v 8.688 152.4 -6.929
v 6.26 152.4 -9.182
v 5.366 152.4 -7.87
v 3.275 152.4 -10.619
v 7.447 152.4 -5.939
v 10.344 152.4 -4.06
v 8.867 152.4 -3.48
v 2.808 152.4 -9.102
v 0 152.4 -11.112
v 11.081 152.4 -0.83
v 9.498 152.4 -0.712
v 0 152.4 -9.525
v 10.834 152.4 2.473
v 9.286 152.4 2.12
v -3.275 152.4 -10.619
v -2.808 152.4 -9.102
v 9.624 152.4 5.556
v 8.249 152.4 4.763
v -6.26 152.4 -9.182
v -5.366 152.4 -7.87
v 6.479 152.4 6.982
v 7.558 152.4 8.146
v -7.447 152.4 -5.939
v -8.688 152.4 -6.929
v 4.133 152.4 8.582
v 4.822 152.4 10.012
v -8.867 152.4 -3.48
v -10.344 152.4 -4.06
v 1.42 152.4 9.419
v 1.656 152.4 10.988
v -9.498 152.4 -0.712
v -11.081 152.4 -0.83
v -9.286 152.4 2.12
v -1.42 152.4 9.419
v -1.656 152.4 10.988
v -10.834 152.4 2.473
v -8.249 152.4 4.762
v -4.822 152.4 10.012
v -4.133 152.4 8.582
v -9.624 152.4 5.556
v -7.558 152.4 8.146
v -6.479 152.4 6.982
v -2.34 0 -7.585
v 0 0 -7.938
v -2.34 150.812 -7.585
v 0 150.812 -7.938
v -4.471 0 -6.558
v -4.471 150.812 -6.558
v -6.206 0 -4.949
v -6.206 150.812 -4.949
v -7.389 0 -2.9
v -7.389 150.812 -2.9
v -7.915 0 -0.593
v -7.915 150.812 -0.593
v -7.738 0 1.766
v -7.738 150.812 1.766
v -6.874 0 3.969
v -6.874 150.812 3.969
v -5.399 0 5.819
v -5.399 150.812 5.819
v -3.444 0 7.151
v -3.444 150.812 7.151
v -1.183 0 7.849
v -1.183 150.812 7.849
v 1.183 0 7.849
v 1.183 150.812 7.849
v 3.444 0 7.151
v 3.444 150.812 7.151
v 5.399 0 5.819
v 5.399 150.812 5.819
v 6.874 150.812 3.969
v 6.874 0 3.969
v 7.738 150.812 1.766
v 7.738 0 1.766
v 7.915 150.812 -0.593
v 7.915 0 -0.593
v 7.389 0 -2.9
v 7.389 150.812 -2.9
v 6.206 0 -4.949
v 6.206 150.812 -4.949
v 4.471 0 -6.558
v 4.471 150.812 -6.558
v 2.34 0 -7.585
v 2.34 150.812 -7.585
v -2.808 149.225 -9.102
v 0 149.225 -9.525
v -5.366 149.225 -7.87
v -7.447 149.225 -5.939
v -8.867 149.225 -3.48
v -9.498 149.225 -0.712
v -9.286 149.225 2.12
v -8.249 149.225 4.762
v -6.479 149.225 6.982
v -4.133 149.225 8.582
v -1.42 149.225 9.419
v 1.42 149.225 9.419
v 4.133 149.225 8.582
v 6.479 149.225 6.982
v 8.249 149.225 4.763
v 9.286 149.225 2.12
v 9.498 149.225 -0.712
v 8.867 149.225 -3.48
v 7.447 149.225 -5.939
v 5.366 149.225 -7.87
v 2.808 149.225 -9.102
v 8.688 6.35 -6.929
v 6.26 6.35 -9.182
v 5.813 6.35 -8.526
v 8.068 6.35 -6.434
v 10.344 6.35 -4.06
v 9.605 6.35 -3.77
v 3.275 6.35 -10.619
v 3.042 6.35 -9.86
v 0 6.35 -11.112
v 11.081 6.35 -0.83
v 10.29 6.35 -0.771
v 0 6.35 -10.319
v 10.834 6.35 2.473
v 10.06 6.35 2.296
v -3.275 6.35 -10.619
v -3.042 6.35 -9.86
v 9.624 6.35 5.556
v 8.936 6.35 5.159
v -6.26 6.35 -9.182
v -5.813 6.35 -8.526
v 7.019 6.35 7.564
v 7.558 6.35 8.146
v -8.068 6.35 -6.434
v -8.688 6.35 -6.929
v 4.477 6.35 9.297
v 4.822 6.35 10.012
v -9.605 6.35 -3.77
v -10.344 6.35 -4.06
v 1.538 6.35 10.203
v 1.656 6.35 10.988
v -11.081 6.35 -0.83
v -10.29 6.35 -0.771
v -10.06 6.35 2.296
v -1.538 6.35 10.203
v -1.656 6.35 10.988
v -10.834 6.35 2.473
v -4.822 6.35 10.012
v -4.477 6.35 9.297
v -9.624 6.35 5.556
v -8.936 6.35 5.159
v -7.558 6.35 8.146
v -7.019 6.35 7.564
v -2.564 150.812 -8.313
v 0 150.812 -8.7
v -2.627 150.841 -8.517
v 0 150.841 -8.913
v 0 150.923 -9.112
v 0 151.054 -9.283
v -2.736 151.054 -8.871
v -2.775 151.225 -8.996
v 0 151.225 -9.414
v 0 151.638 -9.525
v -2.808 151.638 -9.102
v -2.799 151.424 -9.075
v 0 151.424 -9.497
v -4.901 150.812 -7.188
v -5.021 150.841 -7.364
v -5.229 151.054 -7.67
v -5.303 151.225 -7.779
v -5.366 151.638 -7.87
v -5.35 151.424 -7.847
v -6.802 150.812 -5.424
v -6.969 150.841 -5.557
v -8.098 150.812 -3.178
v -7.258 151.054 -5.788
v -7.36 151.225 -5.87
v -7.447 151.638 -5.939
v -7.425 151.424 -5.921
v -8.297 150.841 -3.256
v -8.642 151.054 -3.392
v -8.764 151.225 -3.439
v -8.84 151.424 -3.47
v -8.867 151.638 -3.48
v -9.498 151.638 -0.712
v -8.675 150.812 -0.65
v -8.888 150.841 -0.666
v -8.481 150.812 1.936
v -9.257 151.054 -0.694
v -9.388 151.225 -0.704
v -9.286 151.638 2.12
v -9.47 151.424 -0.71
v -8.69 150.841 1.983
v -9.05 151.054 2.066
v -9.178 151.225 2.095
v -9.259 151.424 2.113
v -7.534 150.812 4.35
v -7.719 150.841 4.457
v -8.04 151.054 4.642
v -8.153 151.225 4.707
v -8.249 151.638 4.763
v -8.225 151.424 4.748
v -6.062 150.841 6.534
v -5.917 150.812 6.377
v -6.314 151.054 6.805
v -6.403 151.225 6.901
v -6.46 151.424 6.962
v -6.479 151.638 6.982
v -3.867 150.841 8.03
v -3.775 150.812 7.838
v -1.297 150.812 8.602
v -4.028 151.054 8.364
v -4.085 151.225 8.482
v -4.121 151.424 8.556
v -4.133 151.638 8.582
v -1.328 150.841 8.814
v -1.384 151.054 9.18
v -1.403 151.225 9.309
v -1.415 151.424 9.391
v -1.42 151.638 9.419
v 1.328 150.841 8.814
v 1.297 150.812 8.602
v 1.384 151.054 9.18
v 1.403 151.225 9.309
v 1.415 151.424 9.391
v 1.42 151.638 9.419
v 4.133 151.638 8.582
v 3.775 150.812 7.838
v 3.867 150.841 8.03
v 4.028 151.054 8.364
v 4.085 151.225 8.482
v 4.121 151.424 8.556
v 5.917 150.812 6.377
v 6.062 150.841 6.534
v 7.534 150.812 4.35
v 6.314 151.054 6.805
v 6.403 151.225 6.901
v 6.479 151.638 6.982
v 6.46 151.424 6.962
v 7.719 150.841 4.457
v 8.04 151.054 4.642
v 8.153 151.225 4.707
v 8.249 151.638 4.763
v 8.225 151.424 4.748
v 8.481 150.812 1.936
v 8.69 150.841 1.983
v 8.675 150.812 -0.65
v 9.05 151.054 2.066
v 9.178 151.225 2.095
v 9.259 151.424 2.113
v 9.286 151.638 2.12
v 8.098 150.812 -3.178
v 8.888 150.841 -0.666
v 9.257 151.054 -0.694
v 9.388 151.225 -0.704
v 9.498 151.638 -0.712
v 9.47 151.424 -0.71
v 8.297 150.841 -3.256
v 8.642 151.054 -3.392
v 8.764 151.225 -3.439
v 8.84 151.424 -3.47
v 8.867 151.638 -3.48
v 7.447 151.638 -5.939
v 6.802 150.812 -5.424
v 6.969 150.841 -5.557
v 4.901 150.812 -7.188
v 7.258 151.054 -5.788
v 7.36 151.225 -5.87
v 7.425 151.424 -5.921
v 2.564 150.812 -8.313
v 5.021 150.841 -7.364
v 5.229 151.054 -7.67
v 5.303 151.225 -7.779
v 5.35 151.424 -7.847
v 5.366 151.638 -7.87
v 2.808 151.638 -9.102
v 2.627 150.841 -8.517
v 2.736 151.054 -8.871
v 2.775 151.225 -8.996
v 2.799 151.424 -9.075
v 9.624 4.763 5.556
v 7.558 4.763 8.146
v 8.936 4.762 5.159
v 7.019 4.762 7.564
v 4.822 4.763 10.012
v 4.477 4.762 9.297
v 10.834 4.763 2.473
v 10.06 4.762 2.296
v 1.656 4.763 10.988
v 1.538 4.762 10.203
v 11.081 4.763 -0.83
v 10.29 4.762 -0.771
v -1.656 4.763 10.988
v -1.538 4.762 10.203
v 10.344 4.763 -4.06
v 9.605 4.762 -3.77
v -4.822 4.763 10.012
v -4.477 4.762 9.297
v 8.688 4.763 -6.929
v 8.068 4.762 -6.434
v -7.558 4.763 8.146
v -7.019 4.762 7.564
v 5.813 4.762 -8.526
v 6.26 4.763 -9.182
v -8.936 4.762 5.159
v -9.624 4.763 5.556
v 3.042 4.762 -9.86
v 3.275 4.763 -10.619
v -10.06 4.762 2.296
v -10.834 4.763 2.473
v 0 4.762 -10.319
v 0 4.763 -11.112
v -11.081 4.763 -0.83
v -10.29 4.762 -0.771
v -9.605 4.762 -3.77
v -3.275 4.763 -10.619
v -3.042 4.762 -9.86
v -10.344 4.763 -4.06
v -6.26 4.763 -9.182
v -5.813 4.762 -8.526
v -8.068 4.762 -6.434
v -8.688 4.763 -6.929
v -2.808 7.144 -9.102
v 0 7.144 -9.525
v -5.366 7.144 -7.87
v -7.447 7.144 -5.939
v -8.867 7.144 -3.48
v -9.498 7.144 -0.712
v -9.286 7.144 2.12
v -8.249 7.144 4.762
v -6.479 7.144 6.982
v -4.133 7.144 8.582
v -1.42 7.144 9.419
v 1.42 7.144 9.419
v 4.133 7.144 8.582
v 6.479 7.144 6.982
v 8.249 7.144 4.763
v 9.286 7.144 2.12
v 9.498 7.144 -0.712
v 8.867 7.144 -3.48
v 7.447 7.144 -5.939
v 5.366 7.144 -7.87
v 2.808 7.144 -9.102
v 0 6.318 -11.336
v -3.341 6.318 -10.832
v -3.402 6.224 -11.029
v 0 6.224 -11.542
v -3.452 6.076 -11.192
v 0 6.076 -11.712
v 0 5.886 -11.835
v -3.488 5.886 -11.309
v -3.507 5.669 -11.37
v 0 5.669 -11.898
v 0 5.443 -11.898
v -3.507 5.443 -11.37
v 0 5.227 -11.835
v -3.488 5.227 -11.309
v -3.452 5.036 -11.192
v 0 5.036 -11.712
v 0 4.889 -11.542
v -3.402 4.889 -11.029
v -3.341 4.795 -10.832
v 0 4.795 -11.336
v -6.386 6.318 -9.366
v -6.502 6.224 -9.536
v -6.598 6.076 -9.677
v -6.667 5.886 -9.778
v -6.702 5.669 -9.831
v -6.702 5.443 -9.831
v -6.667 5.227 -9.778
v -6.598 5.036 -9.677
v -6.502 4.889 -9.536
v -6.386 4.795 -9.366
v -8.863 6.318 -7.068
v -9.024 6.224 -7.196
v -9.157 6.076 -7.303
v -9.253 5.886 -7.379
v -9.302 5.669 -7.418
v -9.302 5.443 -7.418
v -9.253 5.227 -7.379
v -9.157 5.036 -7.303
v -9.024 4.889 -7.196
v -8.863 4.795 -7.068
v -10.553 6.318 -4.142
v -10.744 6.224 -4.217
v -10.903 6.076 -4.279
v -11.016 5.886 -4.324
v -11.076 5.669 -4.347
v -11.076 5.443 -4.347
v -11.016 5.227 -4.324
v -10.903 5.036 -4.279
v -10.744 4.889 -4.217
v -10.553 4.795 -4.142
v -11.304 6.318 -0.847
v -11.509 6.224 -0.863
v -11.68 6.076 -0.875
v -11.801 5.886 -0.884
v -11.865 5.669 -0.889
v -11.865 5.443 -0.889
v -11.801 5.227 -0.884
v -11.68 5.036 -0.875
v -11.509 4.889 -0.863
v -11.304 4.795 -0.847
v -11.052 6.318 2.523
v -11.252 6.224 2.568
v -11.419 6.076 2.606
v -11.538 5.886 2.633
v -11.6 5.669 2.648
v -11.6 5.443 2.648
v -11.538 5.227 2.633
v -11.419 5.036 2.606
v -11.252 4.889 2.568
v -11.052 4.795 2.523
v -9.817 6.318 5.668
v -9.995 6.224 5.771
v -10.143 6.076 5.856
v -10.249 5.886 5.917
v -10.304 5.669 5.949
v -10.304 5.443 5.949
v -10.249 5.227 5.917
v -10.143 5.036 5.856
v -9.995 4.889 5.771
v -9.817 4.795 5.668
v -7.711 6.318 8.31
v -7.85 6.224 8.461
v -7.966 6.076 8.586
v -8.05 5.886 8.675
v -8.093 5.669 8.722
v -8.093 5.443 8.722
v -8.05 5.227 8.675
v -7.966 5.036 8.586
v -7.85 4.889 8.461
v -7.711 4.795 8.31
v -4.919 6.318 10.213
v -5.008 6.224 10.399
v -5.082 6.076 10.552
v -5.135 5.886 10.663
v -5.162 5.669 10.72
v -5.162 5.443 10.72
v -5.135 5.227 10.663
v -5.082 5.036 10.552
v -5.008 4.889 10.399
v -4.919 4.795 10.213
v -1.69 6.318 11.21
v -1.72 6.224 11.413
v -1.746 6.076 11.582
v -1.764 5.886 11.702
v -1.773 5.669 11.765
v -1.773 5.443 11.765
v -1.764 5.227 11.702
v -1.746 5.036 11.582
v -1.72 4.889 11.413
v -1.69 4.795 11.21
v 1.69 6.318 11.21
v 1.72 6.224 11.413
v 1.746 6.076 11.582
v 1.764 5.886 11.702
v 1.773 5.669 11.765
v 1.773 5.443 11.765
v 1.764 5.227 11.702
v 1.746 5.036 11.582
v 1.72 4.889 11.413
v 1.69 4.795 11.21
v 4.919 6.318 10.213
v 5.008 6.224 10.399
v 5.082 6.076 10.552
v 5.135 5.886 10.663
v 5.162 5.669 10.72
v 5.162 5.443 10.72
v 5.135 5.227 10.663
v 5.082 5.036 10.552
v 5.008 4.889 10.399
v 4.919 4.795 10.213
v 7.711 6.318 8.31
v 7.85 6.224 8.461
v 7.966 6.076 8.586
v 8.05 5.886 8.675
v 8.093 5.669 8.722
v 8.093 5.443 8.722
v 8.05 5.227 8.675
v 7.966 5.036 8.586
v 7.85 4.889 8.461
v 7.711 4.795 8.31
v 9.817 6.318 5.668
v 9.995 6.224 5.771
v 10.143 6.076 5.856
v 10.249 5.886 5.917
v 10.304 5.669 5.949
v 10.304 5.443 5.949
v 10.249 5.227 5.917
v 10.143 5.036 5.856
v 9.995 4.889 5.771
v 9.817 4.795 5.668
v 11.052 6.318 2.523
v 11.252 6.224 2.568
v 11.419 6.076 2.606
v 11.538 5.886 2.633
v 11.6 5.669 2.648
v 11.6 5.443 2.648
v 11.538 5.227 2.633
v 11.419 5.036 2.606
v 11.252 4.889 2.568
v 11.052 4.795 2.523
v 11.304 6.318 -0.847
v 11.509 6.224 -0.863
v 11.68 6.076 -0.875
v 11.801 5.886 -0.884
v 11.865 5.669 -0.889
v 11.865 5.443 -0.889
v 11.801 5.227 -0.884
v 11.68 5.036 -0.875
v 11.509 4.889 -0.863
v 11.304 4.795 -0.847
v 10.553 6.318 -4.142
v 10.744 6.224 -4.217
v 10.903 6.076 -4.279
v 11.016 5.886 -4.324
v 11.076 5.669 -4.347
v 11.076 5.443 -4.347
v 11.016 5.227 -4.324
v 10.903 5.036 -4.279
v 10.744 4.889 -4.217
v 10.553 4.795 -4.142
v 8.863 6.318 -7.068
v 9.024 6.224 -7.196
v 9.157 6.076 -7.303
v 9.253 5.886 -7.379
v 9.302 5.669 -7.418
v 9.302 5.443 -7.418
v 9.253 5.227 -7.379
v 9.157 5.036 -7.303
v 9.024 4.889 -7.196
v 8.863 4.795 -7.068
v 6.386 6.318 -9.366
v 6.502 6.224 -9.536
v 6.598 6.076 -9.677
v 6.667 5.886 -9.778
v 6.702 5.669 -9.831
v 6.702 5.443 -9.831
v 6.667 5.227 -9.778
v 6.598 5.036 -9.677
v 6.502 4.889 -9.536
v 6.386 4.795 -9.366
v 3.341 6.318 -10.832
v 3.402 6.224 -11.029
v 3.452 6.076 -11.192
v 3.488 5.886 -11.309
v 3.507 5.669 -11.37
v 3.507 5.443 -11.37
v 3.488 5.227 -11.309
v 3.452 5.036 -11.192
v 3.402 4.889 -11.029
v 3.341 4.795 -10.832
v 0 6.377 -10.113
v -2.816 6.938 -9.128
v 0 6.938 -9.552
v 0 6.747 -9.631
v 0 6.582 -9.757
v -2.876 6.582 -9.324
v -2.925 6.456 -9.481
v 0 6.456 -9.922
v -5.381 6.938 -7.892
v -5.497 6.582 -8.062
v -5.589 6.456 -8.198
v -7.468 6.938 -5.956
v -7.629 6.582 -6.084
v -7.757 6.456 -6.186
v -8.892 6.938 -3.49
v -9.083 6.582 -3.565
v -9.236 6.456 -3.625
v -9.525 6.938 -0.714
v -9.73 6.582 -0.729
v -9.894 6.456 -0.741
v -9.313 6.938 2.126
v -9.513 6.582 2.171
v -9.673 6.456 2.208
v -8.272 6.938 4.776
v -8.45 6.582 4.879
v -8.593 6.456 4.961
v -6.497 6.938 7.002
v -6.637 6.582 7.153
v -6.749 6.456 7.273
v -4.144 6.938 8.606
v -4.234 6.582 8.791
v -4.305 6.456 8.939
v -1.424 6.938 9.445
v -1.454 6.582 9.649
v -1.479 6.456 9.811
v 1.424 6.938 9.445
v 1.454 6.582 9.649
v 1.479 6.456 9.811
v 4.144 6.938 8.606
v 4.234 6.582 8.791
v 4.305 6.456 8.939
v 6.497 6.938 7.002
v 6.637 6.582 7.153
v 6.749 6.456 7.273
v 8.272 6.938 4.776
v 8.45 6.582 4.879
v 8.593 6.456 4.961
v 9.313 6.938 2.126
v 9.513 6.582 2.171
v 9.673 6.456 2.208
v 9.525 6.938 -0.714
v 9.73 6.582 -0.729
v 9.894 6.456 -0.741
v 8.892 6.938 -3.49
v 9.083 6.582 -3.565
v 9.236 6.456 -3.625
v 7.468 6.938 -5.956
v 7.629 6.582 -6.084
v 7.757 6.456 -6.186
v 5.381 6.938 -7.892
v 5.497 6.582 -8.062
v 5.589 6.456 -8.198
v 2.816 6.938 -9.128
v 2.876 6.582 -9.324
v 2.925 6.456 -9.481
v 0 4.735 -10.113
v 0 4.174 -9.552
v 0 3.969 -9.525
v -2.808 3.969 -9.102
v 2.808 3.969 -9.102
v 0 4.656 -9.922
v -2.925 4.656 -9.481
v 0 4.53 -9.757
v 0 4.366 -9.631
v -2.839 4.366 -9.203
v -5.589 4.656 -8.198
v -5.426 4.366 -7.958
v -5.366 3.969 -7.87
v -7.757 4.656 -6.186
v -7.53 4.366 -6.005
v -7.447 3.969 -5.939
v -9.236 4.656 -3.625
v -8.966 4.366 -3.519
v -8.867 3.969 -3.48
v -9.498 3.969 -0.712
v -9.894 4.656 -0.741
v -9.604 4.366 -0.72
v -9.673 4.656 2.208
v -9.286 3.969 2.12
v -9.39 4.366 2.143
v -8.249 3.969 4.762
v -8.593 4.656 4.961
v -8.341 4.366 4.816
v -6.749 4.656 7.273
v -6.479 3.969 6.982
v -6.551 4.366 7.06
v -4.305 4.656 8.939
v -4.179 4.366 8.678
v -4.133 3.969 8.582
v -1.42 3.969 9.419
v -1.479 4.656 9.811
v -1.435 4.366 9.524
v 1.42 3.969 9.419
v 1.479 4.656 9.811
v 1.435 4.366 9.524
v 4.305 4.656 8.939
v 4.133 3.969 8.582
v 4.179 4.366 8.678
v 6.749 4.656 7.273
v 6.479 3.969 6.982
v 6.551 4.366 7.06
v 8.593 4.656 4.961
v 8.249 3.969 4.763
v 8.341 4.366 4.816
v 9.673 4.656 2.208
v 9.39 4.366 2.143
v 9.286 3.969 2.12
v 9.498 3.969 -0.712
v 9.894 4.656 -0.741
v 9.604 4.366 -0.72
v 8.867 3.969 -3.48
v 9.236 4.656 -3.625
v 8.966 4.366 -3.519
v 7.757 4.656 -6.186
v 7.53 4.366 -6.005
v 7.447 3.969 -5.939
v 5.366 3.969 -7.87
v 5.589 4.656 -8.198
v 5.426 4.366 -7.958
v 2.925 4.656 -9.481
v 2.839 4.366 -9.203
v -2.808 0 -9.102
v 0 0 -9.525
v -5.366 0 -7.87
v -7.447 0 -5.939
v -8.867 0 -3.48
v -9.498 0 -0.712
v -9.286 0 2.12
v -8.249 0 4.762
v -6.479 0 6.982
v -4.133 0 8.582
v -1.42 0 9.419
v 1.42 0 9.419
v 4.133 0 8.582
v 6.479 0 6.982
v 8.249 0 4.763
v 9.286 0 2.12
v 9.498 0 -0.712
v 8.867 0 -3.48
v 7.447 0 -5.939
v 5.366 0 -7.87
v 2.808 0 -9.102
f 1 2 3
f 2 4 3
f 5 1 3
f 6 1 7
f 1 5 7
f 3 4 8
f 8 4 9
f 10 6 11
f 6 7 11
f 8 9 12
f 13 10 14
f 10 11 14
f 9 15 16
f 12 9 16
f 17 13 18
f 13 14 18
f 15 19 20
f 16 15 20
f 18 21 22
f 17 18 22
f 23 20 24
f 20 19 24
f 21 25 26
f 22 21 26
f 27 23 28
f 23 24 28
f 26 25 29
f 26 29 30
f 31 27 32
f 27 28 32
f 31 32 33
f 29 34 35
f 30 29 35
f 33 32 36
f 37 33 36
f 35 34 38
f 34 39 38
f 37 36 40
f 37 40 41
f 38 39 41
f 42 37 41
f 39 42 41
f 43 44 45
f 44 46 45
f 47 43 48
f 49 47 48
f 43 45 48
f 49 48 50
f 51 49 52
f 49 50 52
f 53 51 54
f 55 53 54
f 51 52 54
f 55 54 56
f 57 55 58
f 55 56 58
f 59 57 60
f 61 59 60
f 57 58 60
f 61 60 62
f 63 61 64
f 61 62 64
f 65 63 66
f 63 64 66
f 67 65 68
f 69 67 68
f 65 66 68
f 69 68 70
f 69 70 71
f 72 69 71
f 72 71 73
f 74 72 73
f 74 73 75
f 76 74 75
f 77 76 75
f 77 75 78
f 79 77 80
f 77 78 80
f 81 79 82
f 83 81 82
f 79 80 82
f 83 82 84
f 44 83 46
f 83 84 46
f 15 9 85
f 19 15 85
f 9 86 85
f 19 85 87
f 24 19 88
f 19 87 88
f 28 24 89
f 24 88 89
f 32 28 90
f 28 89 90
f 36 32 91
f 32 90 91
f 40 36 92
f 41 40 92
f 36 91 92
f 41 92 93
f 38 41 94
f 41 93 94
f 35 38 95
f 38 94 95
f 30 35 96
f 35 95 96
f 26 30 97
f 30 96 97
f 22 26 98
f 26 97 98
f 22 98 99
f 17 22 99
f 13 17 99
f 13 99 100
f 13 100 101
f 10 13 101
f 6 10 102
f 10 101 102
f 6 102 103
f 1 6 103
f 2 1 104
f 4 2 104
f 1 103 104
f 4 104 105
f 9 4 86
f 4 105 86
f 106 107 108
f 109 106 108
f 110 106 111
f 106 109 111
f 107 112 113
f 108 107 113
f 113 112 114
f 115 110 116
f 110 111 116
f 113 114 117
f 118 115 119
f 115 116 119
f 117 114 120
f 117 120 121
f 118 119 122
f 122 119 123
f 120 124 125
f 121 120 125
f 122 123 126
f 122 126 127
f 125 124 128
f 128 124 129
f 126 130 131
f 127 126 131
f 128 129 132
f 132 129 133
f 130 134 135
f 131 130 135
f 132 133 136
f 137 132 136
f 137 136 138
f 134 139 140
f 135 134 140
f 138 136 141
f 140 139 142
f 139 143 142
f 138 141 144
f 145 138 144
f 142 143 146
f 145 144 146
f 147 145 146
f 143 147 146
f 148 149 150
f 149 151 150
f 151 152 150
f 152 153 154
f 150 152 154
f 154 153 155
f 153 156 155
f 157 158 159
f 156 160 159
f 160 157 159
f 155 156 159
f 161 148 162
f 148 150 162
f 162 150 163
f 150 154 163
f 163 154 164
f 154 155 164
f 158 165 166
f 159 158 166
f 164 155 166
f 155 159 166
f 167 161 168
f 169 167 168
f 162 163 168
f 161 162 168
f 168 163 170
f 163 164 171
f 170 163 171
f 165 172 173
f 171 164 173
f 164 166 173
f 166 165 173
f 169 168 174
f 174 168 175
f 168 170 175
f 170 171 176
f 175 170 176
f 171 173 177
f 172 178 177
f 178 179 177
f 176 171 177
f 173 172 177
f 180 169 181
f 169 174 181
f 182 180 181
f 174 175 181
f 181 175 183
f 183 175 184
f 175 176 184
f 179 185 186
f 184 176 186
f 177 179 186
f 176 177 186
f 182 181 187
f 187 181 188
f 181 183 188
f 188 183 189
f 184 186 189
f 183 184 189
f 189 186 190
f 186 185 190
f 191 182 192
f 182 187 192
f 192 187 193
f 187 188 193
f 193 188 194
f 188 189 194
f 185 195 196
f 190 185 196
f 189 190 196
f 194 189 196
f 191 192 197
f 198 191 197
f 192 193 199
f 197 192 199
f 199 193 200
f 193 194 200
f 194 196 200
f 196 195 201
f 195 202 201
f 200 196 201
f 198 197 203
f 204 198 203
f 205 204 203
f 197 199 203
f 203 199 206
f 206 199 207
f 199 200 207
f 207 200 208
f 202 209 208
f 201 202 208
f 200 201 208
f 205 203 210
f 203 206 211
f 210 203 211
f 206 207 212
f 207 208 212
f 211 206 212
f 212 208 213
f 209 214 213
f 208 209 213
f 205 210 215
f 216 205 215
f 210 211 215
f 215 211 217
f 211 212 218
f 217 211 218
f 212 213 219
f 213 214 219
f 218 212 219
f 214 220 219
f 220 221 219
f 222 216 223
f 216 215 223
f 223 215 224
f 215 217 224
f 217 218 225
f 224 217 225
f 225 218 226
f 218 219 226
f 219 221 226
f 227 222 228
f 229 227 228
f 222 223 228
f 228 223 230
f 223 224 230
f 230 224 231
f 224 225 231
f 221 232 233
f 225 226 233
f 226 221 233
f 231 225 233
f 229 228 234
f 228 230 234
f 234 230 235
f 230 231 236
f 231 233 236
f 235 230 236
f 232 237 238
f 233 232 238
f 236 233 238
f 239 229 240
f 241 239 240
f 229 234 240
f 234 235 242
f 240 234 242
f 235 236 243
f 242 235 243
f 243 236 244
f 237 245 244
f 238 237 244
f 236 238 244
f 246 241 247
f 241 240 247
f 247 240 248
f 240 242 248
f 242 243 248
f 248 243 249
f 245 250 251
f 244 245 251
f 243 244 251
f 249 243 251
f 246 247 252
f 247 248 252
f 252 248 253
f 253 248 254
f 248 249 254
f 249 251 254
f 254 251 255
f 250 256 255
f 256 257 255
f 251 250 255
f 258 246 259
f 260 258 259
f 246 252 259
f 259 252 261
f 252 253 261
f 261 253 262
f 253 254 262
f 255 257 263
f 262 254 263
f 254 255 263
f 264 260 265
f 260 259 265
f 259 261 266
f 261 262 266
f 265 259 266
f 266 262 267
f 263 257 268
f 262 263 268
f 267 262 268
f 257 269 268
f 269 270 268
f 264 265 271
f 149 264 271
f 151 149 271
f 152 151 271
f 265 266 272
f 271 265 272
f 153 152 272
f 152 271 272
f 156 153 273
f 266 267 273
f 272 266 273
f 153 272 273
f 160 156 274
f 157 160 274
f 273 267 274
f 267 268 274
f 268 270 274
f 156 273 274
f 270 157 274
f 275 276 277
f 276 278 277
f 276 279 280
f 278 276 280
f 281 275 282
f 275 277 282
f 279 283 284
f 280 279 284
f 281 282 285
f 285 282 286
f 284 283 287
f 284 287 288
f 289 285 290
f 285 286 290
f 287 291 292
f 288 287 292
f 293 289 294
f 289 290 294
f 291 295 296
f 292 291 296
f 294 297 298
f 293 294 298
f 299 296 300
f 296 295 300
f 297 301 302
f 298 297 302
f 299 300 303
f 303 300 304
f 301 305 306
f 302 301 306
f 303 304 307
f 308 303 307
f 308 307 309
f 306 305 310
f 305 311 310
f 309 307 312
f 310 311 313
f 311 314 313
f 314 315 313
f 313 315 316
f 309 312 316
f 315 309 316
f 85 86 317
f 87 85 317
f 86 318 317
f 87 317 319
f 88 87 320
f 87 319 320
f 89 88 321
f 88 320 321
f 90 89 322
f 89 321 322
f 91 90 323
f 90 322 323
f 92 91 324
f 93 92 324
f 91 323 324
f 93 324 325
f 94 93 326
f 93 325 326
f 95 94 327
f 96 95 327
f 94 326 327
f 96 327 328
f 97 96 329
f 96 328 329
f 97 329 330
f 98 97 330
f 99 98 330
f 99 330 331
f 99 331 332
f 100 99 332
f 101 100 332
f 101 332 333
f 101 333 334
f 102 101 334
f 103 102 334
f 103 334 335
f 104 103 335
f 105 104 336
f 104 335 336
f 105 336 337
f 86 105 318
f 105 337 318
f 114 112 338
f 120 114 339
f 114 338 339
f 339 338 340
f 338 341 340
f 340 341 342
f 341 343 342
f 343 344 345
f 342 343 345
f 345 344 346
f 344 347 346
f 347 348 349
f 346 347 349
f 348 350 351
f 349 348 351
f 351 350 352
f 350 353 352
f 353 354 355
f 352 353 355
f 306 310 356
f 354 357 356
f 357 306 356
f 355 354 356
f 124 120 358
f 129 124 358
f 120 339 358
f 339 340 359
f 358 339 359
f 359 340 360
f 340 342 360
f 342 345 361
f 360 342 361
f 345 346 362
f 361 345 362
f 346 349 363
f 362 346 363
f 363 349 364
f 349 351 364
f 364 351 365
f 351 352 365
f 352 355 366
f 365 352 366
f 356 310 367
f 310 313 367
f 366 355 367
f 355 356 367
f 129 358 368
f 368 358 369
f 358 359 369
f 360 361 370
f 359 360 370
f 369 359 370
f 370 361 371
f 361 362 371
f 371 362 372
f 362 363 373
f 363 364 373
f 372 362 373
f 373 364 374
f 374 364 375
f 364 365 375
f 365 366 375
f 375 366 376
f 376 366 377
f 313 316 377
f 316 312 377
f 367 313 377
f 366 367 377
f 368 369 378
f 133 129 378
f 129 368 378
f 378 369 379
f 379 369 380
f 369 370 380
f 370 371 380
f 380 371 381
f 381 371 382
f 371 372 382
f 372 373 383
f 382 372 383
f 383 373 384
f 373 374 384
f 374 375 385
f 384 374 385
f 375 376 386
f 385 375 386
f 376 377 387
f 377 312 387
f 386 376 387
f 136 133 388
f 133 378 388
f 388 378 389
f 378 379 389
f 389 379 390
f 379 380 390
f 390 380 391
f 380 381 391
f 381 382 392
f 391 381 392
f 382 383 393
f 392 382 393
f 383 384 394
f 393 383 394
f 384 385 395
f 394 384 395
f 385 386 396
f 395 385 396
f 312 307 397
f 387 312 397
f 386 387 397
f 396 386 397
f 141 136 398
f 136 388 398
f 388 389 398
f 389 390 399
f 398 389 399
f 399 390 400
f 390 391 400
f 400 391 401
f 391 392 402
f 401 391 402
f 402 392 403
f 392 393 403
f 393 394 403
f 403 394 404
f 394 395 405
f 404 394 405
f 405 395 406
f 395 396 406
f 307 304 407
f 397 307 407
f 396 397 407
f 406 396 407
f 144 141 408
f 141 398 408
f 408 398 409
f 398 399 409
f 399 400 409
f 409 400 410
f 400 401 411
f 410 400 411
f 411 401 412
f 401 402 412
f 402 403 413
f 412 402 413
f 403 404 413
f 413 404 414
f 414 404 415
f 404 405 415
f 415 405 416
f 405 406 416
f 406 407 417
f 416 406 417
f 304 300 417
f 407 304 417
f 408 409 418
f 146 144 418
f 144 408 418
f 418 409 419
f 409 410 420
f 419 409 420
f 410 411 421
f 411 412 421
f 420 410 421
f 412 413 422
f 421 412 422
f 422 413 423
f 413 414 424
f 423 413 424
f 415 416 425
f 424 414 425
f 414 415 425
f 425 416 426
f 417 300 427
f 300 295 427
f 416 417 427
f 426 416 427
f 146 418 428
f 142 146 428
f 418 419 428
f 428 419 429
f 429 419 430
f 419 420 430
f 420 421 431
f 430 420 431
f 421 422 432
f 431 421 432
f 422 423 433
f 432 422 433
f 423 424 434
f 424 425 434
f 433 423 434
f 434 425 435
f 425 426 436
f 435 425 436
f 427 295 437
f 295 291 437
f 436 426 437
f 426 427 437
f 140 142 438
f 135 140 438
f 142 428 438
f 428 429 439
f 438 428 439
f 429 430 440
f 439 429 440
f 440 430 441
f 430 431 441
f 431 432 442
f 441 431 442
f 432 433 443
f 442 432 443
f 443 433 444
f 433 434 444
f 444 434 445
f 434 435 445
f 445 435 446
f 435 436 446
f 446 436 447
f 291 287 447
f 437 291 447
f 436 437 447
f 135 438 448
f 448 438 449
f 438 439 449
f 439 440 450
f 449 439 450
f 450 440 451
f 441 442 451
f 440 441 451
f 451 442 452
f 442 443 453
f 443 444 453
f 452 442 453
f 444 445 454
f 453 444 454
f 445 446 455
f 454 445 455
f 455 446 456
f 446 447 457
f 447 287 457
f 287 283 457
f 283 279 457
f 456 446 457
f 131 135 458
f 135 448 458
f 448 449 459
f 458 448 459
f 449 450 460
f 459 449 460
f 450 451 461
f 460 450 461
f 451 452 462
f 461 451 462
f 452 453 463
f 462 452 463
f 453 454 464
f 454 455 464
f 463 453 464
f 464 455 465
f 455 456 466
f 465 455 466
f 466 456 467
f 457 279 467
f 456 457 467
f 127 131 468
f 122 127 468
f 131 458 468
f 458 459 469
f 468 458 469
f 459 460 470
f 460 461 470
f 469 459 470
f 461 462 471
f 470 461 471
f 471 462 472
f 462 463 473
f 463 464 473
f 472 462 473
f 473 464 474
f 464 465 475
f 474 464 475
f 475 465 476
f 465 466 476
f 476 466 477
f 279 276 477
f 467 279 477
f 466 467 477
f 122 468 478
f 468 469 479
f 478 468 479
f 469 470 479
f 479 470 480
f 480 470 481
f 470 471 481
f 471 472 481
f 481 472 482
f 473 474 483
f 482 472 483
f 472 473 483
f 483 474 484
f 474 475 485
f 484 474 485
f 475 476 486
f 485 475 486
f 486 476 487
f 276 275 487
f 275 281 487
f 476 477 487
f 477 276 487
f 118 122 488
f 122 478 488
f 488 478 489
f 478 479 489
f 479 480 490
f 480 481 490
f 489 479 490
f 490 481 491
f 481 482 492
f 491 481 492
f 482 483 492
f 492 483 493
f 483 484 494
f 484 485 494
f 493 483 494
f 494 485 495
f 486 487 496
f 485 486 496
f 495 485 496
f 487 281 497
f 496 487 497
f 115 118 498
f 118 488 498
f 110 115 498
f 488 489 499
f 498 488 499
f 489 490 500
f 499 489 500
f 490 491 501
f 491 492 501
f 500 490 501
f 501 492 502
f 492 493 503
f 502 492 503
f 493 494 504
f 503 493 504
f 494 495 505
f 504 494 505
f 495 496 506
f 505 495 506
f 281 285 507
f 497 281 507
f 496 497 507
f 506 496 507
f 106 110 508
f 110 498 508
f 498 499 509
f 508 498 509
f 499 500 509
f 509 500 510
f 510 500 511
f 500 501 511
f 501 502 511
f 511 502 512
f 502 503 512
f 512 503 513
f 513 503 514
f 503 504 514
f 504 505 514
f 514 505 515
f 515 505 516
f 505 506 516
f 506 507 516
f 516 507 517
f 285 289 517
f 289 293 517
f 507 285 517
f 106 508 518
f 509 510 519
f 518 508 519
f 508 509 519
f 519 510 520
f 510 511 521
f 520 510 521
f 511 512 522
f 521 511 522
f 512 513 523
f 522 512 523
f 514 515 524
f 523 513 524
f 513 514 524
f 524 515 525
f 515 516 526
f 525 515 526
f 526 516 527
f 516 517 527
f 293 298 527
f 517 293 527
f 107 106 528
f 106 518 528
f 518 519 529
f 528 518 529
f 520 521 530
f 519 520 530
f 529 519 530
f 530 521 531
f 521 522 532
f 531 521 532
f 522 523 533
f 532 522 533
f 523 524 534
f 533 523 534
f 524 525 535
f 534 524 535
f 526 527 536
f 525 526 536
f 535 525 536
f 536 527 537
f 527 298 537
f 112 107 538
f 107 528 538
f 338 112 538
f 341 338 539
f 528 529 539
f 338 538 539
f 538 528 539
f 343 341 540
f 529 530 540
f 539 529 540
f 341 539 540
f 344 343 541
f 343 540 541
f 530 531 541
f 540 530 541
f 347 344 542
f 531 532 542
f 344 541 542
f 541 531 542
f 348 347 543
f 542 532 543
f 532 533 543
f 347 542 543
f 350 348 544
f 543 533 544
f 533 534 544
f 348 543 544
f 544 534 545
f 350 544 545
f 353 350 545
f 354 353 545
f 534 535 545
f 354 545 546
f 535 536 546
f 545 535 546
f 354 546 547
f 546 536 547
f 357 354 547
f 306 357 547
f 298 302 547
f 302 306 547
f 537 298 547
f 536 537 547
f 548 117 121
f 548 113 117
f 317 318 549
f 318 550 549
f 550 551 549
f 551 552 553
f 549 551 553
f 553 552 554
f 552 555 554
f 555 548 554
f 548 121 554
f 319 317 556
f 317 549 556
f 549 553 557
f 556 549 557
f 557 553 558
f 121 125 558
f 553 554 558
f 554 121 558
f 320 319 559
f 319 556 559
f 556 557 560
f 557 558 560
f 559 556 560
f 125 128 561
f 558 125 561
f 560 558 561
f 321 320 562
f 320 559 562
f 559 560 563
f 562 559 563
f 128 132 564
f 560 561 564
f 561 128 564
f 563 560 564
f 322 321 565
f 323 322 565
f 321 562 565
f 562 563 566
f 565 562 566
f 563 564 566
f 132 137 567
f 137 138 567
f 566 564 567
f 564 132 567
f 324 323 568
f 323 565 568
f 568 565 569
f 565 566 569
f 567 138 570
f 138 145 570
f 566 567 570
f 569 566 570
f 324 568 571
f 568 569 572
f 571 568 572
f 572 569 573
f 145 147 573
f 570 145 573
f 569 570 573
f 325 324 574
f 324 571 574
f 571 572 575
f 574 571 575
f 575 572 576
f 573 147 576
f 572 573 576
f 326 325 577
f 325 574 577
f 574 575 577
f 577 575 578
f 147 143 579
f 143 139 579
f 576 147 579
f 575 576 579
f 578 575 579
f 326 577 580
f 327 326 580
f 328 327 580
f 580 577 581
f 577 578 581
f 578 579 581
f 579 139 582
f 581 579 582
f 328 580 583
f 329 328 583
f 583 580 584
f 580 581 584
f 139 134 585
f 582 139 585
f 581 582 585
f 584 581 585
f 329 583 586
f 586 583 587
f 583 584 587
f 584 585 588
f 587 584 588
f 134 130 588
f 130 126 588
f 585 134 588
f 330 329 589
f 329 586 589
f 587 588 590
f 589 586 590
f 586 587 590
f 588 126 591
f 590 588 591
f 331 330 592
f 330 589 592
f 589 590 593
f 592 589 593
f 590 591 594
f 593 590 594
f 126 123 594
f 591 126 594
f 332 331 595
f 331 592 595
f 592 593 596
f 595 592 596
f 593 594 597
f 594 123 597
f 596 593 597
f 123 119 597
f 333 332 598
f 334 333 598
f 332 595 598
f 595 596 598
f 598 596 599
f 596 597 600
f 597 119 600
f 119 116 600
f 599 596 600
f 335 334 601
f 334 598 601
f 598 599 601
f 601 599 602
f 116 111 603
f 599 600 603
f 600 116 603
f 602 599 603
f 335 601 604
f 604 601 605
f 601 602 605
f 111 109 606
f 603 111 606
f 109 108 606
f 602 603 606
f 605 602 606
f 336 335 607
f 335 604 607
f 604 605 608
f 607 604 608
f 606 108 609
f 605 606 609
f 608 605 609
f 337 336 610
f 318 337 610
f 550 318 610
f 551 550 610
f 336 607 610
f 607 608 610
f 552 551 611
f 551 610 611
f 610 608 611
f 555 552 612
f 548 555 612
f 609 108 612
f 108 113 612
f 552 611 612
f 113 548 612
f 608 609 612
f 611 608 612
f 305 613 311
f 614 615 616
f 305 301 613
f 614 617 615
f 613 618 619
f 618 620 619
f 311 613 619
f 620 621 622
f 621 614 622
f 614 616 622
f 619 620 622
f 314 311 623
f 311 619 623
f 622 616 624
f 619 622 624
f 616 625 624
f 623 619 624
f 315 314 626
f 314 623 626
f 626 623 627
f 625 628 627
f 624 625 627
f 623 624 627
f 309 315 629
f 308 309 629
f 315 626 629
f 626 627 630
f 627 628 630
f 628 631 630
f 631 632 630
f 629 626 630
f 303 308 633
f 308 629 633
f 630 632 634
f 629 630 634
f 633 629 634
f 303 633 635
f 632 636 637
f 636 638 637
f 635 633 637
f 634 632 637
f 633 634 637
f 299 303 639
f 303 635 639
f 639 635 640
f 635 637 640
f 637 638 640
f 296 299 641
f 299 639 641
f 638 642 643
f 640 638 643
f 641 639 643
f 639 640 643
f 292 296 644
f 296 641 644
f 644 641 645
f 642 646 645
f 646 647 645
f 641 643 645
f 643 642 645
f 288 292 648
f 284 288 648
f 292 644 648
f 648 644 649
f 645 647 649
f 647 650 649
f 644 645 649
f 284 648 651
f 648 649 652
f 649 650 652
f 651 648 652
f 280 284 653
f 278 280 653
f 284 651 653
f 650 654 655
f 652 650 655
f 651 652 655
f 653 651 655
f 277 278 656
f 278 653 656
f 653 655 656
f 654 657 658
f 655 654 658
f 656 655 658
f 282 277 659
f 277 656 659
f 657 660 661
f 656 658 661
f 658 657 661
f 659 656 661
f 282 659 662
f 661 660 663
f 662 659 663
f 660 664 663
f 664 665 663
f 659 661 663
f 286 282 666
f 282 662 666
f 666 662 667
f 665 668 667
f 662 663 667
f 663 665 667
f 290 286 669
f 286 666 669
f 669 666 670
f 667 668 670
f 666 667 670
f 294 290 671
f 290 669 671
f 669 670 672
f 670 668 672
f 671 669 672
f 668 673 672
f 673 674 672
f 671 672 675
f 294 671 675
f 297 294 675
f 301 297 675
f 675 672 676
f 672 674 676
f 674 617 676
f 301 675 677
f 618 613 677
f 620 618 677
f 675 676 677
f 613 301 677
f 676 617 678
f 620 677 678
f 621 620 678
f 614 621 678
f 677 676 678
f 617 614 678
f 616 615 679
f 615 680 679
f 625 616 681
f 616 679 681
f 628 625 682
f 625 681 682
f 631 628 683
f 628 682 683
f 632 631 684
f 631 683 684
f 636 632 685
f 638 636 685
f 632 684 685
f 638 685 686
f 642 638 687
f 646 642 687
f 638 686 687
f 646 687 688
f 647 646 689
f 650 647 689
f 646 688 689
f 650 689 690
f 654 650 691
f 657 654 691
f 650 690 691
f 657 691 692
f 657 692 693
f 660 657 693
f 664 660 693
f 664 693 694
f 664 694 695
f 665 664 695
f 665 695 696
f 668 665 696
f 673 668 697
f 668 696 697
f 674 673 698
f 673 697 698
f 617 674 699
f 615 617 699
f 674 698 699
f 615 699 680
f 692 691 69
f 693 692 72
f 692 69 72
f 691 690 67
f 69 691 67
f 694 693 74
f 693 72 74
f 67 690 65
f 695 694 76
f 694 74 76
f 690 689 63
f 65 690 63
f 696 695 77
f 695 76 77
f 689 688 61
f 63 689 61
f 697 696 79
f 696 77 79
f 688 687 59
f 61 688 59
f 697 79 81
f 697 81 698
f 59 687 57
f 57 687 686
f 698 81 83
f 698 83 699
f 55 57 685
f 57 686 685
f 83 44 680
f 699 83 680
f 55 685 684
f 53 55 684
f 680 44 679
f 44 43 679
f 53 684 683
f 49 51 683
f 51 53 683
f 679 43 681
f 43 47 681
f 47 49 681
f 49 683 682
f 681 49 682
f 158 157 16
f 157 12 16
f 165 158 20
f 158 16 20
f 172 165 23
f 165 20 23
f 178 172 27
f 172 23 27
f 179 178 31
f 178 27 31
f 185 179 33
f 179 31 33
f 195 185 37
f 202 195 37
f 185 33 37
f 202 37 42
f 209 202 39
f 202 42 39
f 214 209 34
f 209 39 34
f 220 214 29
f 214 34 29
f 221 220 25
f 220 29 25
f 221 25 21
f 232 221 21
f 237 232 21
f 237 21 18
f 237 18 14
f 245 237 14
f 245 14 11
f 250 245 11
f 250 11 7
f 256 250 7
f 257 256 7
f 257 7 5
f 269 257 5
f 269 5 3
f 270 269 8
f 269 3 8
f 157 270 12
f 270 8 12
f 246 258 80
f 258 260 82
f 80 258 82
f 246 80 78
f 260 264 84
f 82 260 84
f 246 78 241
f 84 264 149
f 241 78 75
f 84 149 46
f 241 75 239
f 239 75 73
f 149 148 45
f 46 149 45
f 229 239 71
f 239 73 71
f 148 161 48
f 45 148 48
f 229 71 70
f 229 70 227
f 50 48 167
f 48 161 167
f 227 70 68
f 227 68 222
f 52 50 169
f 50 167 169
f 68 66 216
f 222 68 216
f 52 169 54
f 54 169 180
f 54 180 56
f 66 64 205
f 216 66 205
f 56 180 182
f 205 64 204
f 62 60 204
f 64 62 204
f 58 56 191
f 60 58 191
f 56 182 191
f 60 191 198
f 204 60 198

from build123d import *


with BuildPart() as part:
    # Sketch1 → Revolve1 (revolve)
    with BuildSketch(Plane.XY, mode=Mode.PRIVATE) as revolve1_sk:
        with BuildLine():
            Line((-7.9375, 0), (-7.9375, 150.8125))
            Line((-7.9375, 150.8125), (-8.6995, 150.8125))
            ThreePointArc((-8.6995, 150.8125), (-9.283216648, 151.054283352), (-9.525, 151.638))
            Line((-9.525, 151.638), (-9.525, 152.4))
            Line((-9.525, 152.4), (-11.1125, 152.4))
            Line((-11.1125, 152.4), (-9.525, 149.225))
            Line((-9.525, 149.225), (-9.525, 7.14375))
            ThreePointArc((-9.525, 7.14375), (-9.757483992, 6.582483992), (-10.31875, 6.35))
            Line((-10.31875, 6.35), (-11.1125, 6.35))
            ThreePointArc((-11.1125, 6.35), (-11.90625, 5.55625), (-11.1125, 4.7625))
            Line((-11.1125, 4.7625), (-10.31875, 4.7625))
            ThreePointArc((-10.31875, 4.7625), (-9.757483992, 4.530016008), (-9.525, 3.96875))
            Line((-9.525, 3.96875), (-9.525, 0))
            Line((-9.525, 0), (-7.9375, 0))
        make_face()
    revolve(revolve1_sk.sketch.rotate(Axis((0, 0, 0), (0, 1, 0)), 270), axis=Axis((0, 0, 0), (0, 1, 0)))


solid = part.part
